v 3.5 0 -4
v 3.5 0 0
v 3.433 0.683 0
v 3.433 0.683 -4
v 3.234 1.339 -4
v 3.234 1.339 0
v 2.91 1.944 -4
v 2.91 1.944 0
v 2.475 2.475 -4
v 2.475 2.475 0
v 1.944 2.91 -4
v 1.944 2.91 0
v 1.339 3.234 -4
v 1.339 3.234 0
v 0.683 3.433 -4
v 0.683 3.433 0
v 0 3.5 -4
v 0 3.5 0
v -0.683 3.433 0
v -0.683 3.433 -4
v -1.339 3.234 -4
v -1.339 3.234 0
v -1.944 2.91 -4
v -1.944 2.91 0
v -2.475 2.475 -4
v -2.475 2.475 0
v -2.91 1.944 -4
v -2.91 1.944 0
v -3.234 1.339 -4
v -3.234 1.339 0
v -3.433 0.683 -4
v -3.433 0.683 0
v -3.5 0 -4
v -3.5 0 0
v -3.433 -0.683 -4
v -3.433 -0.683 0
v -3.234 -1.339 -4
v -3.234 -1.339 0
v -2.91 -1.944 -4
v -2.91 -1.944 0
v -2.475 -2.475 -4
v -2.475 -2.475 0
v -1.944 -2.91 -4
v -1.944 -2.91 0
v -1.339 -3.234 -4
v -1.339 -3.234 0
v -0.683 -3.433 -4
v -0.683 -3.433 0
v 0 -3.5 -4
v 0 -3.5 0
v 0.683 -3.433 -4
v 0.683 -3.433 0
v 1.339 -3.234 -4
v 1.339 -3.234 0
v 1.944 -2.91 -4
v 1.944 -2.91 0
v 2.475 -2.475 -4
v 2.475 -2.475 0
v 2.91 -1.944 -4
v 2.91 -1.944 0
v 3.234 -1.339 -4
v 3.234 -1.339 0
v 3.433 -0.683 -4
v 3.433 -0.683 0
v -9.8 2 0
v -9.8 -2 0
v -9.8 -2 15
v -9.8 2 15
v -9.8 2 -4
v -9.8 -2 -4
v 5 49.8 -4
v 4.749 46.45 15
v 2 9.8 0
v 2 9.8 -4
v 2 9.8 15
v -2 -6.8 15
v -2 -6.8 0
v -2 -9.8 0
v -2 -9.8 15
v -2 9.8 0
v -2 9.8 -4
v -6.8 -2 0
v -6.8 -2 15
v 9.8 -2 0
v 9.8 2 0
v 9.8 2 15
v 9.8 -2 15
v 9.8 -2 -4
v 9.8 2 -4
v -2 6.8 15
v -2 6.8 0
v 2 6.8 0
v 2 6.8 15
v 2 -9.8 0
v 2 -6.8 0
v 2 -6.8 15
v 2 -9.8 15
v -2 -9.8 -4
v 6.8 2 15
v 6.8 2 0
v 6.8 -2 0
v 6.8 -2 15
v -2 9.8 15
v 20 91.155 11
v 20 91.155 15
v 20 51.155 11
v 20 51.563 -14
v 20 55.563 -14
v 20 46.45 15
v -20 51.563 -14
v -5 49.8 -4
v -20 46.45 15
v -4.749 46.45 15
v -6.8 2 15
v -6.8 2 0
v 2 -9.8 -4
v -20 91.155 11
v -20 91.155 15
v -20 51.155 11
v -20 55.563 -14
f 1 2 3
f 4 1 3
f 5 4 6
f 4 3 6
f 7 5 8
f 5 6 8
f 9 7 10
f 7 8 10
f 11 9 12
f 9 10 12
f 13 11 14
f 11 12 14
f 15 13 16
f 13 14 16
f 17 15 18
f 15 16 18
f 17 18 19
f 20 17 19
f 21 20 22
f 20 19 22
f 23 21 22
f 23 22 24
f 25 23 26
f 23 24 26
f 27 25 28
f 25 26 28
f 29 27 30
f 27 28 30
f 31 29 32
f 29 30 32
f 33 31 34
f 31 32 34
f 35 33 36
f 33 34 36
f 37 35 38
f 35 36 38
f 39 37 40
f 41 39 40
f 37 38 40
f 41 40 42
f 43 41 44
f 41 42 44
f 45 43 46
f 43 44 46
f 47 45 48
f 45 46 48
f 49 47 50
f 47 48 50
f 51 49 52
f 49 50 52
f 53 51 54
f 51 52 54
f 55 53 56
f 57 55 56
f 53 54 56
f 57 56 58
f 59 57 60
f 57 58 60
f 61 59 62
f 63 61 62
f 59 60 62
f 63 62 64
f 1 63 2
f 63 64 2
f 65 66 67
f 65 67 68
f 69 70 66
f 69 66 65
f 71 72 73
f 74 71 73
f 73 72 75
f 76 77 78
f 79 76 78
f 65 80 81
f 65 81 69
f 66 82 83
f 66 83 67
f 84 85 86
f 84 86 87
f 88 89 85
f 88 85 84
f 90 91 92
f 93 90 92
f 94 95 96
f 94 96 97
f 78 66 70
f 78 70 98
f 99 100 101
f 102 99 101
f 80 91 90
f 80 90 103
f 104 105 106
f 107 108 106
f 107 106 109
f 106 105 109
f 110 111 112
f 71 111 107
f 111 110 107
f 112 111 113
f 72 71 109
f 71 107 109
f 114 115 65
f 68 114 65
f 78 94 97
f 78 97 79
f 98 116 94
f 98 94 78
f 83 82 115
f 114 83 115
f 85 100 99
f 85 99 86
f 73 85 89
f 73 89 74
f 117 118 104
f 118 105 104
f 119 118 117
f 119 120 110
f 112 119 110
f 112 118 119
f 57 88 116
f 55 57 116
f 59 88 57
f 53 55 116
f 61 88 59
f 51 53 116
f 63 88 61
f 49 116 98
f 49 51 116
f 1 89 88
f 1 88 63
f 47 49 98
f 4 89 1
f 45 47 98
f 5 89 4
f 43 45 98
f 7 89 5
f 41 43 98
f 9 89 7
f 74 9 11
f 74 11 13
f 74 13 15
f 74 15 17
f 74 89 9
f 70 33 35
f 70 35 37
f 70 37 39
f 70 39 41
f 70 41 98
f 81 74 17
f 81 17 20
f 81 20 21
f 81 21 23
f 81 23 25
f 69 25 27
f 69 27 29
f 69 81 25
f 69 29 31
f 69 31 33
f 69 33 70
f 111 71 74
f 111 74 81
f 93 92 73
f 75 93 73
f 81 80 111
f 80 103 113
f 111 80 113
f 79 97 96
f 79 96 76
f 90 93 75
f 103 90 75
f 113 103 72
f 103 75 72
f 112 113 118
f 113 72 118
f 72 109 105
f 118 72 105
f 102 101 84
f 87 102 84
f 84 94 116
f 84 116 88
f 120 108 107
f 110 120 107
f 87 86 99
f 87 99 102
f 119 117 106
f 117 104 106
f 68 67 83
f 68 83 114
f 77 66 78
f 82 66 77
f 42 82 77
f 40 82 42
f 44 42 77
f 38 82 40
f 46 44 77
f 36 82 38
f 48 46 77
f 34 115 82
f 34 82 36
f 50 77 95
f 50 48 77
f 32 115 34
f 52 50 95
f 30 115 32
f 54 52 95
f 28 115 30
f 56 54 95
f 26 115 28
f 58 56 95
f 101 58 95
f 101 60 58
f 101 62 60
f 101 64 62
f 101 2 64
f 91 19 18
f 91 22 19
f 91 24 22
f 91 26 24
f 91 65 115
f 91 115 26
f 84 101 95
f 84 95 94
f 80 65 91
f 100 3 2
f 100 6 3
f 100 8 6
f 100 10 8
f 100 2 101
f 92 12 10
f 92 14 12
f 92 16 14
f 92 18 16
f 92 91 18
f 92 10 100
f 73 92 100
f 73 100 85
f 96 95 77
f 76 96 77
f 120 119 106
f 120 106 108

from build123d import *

# Parameters (mm, degrees)
SKETCH_R           = 3.5
PAD_DEPTH          = 4
SKETCH001_W        = 4
SKETCH001_H        = 3
PAD001_DEPTH       = 15
POLARPATTERN_COUNT = 4
PAD002_DEPTH       = 15
PAD004_DEPTH       = 4
PAD005_DEPTH       = 20


with BuildPart() as part:
    # Sketch → Pad (new body)
    with BuildSketch(Plane.XY):
        Polygon((-9.8, 2), (-9.8, -2), (-2, -9.8), (2, -9.8), (9.8, -2), (9.8, 2), (2, 9.8), (-2, 9.8), align=None)
        Circle(SKETCH_R, mode=Mode.SUBTRACT)
    extrude(amount=-PAD_DEPTH)

    # Sketch001 → Pad001 (join)
    with BuildSketch(Plane.XY):
        with Locations((0, 8.3)):
            Rectangle(SKETCH001_W, SKETCH001_H)
    pad001 = extrude(amount=PAD001_DEPTH)

    # PolarPattern: Pad001 ×4 about axis
    polarpattern_axis = Axis((0, 0, 0), (0, 0, 1))
    for i in range(1, POLARPATTERN_COUNT):
        add(pad001.rotate(polarpattern_axis, i * 360 / POLARPATTERN_COUNT))

    # Sketch002 → Pad002 (join)
    with BuildSketch(Plane.XY):
        Polygon((-2, 9.8), (-5, 49.8), (5, 49.8), (2, 9.8), align=None)
    extrude(amount=PAD002_DEPTH)

    # Sketch002 → Pad004 (join)
    with BuildSketch(Plane.XY):
        Polygon((-2, 9.8), (-5, 49.8), (5, 49.8), (2, 9.8), align=None)
    extrude(amount=-PAD004_DEPTH)

    # Sketch003 → Pad005 (join, symmetric)
    with BuildSketch(Plane.YZ):
        Polygon((46.449787, 15), (91.155095, 15), (91.155095, 11), (51.155095, 11), (55.56327, -14), (51.56327, -14), align=None)
    extrude(amount=PAD005_DEPTH, both=True)


solid = part.part
